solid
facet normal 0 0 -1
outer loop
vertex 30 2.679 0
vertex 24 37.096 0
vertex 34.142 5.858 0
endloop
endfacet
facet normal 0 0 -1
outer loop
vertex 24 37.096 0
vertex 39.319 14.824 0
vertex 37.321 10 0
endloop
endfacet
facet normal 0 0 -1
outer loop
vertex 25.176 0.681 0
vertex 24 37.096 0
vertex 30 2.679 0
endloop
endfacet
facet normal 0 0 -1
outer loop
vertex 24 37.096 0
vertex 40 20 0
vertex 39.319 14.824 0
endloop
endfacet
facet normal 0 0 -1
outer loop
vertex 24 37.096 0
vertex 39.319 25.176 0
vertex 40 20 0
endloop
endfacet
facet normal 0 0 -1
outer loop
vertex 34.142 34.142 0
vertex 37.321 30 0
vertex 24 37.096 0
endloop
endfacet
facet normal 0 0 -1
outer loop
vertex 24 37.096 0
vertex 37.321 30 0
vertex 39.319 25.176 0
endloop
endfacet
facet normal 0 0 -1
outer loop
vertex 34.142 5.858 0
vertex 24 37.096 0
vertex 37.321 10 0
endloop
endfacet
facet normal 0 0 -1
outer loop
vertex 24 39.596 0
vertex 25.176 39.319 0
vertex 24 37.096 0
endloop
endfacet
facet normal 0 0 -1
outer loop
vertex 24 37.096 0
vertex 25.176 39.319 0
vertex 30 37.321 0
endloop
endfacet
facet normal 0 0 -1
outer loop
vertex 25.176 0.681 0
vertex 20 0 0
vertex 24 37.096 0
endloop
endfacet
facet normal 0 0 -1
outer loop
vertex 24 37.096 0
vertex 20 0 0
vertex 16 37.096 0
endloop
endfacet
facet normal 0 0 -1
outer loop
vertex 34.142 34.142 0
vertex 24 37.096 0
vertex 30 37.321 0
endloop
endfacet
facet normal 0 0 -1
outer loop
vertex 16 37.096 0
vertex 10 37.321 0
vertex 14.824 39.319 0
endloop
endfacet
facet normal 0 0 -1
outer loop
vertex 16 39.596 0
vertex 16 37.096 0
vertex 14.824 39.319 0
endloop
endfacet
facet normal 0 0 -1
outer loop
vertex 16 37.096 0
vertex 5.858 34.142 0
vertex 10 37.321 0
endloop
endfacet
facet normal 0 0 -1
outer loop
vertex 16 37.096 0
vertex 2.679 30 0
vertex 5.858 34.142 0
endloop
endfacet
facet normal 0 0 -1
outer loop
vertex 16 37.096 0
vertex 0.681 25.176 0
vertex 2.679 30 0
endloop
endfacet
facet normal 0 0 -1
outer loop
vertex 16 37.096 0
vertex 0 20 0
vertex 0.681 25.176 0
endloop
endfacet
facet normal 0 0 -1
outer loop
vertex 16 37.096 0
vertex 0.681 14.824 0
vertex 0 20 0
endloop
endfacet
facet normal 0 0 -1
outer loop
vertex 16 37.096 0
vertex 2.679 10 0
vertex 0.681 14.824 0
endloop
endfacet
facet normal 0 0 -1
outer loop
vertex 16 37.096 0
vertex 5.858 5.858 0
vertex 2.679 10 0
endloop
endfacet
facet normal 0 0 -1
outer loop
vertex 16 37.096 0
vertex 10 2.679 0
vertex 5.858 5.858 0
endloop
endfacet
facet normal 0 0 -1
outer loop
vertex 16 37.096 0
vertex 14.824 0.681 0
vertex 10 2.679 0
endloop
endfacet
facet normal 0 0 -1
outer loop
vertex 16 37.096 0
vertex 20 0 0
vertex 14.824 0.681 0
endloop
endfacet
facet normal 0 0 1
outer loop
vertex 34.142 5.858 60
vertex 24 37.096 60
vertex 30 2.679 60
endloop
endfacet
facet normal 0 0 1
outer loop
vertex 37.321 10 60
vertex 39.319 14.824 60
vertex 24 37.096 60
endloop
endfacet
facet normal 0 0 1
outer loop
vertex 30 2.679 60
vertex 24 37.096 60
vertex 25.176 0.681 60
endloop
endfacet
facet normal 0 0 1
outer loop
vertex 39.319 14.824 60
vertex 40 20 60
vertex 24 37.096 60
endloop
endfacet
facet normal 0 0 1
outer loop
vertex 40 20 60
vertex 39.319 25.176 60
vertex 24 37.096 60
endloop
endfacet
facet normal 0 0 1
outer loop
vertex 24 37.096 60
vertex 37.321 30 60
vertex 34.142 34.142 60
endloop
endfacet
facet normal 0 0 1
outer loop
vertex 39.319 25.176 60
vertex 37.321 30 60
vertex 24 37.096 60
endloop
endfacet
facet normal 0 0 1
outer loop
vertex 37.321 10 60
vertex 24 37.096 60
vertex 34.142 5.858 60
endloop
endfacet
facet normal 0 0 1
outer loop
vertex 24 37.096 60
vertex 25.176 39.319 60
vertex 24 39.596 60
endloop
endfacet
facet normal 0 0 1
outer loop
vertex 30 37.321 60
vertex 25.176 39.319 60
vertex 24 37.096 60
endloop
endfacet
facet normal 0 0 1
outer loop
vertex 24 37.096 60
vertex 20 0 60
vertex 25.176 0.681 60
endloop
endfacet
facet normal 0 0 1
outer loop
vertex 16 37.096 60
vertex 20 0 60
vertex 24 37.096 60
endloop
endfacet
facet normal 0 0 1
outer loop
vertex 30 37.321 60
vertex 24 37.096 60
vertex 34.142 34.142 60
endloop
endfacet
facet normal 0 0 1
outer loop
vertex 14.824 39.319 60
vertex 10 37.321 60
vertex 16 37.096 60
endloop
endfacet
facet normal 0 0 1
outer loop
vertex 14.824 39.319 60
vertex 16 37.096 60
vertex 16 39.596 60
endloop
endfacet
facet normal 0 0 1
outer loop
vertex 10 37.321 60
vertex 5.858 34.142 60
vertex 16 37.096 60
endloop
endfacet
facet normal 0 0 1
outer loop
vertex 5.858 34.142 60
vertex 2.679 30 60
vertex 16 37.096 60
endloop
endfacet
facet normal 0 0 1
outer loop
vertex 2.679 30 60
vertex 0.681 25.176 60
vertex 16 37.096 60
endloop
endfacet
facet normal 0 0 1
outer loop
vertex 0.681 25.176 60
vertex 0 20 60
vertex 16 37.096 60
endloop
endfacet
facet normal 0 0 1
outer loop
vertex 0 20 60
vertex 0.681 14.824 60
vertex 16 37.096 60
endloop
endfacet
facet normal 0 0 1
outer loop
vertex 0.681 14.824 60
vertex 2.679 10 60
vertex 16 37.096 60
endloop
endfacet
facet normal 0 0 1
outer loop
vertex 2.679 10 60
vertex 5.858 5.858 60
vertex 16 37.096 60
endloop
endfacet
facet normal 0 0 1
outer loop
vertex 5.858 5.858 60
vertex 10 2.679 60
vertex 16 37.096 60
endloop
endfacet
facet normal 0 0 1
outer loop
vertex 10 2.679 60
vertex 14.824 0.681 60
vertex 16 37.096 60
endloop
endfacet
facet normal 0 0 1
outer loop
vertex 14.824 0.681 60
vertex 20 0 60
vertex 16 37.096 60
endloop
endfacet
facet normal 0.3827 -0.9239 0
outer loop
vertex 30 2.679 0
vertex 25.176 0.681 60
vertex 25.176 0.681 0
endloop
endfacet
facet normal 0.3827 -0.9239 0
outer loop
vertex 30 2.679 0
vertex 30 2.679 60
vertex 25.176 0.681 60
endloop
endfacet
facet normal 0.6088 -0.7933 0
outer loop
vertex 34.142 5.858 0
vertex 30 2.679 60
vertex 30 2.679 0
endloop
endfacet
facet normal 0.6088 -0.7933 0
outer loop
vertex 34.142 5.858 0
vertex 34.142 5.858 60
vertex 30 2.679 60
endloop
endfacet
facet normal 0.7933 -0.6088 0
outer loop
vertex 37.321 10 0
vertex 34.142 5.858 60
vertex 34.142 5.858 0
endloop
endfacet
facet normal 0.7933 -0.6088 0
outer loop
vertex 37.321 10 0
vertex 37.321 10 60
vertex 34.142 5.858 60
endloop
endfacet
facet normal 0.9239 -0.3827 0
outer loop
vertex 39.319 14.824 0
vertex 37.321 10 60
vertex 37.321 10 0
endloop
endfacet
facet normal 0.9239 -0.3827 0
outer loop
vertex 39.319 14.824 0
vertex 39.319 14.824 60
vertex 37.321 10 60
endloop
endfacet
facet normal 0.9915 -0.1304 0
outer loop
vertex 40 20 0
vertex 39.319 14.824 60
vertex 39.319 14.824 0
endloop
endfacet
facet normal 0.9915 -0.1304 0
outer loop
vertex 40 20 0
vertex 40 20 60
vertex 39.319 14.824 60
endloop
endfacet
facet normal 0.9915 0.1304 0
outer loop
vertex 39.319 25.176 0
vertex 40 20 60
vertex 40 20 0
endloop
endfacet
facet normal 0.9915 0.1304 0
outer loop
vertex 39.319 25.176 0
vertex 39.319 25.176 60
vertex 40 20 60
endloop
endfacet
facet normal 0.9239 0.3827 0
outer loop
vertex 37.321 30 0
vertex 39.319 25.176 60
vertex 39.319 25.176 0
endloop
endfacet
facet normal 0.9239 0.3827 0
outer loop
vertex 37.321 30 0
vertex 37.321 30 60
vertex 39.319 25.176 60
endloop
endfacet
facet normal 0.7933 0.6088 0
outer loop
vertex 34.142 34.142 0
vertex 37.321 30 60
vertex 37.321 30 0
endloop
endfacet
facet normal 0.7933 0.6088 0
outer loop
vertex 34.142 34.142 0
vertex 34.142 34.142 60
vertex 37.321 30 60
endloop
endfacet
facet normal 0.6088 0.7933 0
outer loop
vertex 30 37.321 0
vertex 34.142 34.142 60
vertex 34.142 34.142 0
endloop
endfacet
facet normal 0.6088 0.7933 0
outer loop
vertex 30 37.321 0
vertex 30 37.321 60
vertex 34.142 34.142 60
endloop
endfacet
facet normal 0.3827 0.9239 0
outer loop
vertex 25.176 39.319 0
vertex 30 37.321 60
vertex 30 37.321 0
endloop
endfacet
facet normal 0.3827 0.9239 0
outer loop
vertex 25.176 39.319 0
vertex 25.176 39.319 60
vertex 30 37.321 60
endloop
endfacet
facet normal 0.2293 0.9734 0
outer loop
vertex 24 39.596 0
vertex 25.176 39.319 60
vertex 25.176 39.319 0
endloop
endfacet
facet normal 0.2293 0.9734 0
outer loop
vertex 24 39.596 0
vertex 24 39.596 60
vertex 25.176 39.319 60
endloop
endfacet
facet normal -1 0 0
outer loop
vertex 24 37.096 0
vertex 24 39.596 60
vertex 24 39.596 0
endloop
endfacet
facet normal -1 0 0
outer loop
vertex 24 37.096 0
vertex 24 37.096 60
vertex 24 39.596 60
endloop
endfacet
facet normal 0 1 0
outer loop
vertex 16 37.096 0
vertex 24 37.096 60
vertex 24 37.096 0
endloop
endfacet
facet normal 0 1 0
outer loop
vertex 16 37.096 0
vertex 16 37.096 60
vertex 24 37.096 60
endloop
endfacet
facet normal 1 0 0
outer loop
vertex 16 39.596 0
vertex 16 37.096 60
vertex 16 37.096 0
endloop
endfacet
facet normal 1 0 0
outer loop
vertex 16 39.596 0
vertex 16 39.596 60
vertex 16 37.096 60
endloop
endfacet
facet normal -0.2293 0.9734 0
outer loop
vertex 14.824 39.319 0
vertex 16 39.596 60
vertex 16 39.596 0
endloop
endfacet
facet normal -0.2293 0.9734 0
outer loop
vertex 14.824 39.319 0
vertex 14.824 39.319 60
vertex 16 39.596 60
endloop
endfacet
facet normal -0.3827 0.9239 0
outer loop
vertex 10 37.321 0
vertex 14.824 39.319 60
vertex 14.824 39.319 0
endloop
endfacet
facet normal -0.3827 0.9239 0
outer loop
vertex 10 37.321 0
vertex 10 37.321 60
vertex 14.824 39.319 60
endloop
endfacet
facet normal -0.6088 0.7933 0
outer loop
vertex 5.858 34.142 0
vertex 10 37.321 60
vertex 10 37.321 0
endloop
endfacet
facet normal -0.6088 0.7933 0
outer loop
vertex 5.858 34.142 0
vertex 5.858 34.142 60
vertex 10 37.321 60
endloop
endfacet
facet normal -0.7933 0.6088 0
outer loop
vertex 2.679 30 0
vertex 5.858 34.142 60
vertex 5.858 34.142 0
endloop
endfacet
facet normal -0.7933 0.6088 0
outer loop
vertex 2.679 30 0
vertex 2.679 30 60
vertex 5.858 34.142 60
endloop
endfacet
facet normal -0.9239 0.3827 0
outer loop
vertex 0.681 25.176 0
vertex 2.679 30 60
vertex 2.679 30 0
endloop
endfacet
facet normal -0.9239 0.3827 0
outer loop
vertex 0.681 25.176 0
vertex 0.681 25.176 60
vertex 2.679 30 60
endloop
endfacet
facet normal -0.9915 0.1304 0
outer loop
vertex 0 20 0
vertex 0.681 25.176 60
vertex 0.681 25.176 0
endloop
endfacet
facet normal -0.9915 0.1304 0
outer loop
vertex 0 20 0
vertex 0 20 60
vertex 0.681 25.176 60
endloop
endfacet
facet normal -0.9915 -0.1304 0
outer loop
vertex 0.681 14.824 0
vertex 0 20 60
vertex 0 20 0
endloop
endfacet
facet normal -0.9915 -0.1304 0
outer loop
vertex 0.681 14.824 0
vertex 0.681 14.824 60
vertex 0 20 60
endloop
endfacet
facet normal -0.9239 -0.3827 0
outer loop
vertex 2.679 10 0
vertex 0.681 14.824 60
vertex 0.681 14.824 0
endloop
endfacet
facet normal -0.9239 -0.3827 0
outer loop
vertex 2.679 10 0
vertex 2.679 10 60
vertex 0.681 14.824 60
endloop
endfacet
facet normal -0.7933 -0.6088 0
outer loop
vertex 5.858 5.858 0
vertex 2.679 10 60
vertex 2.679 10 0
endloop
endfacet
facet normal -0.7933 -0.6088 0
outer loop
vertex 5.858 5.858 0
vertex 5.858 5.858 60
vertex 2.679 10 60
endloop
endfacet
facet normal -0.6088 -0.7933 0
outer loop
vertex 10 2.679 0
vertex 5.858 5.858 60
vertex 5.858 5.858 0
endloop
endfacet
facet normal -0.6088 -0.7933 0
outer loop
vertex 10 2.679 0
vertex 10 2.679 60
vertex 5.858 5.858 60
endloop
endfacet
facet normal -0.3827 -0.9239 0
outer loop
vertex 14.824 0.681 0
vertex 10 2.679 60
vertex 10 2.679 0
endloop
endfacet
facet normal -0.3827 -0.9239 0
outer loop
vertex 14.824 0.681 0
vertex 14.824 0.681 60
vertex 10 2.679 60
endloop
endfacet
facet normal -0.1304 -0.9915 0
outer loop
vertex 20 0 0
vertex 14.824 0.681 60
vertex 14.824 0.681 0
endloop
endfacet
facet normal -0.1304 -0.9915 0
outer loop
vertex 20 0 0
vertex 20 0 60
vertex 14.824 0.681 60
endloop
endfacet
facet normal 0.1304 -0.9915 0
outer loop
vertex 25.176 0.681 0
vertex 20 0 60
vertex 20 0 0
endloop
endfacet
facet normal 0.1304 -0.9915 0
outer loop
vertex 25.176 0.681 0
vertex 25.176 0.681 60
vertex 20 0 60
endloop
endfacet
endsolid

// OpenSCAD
$fn = 32;

// ----------------------------------------------------------------------
// Keyway shaft: d40 shaft, key 8 x 2.5 mm
// ----------------------------------------------------------------------

// --- parameters (mm) ---
shaft_r = 20;             // shaft radius
key_w = 8;                // keyway width
key_d = 2.5;              // keyway depth below the surface line
plate_t = 60;             // shaft length, Z (extrusion height)

shaft_d = 2 * shaft_r;  // shaft diameter
circle_step = 15;  // polygon sampling step, degrees

profile = [[14.824, 39.319], [10, 37.321], [5.858, 34.142], [2.679, 30], [0.681, 25.176], [0, 20], [0.681, 14.824], [2.679, 10], [5.858, 5.858], [10, 2.679], [14.824, 0.681], [20, 0], [25.176, 0.681], [30, 2.679], [34.142, 5.858], [37.321, 10], [39.319, 14.824], [40, 20], [39.319, 25.176], [37.321, 30], [34.142, 34.142], [30, 37.321], [25.176, 39.319], [24, 39.596], [24, 37.096], [16, 37.096], [16, 39.596]];  // primary outline, 27 points, counter clockwise

// --- the one profile operation ---
linear_extrude(height = plate_t) polygon(points = profile);
